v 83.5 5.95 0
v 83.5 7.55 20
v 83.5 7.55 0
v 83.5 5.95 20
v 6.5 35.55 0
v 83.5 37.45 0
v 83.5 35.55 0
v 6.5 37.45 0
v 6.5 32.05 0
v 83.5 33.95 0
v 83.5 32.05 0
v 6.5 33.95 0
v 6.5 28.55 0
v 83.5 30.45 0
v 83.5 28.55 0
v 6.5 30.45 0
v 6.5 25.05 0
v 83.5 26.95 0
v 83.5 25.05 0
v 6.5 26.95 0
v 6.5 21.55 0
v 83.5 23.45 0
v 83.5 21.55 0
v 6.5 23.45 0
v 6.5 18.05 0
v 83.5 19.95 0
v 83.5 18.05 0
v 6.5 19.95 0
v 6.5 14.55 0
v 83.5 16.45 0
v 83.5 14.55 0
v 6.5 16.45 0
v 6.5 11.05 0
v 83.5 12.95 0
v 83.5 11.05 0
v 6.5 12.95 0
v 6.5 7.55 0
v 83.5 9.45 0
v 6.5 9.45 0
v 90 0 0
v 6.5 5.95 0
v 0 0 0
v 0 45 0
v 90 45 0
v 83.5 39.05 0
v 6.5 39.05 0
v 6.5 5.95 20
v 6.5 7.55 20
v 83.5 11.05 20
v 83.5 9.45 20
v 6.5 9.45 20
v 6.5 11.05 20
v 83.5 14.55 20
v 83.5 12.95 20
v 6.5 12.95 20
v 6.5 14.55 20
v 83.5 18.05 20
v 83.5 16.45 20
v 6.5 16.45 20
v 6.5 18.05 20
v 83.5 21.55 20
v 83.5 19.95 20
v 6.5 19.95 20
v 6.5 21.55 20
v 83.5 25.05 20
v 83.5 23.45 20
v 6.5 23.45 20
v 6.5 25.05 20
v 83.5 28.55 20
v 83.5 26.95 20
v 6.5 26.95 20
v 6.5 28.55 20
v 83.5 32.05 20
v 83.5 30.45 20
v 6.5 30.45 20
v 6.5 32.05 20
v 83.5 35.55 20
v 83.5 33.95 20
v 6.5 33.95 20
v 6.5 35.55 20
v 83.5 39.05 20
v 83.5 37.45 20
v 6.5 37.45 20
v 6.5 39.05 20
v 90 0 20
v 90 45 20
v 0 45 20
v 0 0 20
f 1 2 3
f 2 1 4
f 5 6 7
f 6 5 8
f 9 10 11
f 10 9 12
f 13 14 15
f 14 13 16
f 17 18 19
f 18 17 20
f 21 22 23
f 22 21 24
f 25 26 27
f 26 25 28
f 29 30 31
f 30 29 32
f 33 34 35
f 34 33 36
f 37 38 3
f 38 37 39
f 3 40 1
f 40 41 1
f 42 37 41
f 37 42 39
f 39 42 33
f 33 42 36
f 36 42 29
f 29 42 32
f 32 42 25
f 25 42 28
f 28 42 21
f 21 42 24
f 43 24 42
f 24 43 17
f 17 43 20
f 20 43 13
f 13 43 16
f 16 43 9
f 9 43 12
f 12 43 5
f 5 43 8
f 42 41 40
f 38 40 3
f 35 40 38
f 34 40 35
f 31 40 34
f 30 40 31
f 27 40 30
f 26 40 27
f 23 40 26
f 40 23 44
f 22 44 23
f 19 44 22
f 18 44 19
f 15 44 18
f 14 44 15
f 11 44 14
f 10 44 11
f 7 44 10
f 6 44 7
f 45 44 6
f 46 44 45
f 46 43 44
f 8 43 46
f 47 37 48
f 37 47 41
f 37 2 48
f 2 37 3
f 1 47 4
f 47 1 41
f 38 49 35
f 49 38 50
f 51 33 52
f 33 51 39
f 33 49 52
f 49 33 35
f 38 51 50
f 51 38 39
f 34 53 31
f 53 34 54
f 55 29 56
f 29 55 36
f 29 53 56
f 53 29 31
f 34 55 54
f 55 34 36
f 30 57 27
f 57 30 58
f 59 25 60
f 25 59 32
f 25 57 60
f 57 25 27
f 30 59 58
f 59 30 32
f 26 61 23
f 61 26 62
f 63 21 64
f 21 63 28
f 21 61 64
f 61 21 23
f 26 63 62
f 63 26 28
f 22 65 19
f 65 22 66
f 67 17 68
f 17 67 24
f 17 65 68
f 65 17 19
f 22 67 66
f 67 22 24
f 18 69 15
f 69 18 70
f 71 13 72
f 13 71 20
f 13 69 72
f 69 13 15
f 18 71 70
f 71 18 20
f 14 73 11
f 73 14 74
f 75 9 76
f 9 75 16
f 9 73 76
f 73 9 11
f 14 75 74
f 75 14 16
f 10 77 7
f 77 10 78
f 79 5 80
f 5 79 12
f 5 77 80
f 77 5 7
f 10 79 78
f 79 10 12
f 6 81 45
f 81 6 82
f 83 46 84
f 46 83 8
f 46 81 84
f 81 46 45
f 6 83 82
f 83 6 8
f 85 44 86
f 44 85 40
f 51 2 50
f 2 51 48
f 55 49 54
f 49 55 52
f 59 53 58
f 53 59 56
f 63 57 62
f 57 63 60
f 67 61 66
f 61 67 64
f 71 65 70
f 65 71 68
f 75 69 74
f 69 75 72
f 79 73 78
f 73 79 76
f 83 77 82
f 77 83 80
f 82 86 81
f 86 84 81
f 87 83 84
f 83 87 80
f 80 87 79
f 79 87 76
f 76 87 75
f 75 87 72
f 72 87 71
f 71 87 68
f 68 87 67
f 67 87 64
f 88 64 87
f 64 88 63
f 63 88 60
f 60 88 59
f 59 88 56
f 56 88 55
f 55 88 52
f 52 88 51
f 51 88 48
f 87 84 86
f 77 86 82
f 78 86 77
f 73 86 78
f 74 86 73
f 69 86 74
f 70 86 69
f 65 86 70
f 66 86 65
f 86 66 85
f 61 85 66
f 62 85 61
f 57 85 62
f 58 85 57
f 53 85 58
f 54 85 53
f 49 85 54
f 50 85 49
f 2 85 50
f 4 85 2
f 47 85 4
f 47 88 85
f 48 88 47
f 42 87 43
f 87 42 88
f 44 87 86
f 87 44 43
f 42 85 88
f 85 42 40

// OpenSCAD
// Microscope slide drying rack - a solid base with 10 parallel slots for standing slides.
// Note: Standard microscope slides are 25mm tall when standing on their long edge.
// To hold them upright, the slots must be full depth (20mm). The original spec requested 10mm depth,
// which would not support 25mm tall slides. Depth corrected to 20mm for functionality.

// Base dimensions
L_base = 90;
W_base = 45;
H_base = 20;

// Slide dimensions (standard 75x25x1 mm)
slide_len = 75;
slide_w   = 25;
slide_thk = 1;

// Slot dimensions
slot_len = 77;
slot_w   = 1.6;
slot_deep = 20; // Corrected from 10 to 20 to accommodate 25mm tall slides standing upright.

// Spacing and positioning
slot_spacing = 3.5;
num_slots = 10;

// Derived positions
// Slots are centred in Y on the block
// First slot Y position: (W_base - slot_w) / 2 - (num_slots - 1) * slot_spacing / 2
y_start = (W_base - slot_w) / 2 - (num_slots - 1) * slot_spacing / 2;

// Slots are centred in X on the block
x_start = (L_base - slot_len) / 2;

$fn = 64;

difference() {
    // Main solid block
    translate([0, 0, 0]) cube([L_base, W_base, H_base]);

    // Cut 10 slots
    for (i = [0 : num_slots - 1]) {
        // Calculate Y position for this slot
        y_pos = y_start + i * slot_spacing;
        
        // Slot geometry: runs along X, width in Y, depth in Z
        // Slot is open at top (Z=H_base), so we cut from Z=0 to Z=slot_deep
        // To ensure clean cut, extend slightly past the bottom face
        translate([x_start, y_pos, 0]) 
            cube([slot_len, slot_w, slot_deep + 0.1]);
    }
}
